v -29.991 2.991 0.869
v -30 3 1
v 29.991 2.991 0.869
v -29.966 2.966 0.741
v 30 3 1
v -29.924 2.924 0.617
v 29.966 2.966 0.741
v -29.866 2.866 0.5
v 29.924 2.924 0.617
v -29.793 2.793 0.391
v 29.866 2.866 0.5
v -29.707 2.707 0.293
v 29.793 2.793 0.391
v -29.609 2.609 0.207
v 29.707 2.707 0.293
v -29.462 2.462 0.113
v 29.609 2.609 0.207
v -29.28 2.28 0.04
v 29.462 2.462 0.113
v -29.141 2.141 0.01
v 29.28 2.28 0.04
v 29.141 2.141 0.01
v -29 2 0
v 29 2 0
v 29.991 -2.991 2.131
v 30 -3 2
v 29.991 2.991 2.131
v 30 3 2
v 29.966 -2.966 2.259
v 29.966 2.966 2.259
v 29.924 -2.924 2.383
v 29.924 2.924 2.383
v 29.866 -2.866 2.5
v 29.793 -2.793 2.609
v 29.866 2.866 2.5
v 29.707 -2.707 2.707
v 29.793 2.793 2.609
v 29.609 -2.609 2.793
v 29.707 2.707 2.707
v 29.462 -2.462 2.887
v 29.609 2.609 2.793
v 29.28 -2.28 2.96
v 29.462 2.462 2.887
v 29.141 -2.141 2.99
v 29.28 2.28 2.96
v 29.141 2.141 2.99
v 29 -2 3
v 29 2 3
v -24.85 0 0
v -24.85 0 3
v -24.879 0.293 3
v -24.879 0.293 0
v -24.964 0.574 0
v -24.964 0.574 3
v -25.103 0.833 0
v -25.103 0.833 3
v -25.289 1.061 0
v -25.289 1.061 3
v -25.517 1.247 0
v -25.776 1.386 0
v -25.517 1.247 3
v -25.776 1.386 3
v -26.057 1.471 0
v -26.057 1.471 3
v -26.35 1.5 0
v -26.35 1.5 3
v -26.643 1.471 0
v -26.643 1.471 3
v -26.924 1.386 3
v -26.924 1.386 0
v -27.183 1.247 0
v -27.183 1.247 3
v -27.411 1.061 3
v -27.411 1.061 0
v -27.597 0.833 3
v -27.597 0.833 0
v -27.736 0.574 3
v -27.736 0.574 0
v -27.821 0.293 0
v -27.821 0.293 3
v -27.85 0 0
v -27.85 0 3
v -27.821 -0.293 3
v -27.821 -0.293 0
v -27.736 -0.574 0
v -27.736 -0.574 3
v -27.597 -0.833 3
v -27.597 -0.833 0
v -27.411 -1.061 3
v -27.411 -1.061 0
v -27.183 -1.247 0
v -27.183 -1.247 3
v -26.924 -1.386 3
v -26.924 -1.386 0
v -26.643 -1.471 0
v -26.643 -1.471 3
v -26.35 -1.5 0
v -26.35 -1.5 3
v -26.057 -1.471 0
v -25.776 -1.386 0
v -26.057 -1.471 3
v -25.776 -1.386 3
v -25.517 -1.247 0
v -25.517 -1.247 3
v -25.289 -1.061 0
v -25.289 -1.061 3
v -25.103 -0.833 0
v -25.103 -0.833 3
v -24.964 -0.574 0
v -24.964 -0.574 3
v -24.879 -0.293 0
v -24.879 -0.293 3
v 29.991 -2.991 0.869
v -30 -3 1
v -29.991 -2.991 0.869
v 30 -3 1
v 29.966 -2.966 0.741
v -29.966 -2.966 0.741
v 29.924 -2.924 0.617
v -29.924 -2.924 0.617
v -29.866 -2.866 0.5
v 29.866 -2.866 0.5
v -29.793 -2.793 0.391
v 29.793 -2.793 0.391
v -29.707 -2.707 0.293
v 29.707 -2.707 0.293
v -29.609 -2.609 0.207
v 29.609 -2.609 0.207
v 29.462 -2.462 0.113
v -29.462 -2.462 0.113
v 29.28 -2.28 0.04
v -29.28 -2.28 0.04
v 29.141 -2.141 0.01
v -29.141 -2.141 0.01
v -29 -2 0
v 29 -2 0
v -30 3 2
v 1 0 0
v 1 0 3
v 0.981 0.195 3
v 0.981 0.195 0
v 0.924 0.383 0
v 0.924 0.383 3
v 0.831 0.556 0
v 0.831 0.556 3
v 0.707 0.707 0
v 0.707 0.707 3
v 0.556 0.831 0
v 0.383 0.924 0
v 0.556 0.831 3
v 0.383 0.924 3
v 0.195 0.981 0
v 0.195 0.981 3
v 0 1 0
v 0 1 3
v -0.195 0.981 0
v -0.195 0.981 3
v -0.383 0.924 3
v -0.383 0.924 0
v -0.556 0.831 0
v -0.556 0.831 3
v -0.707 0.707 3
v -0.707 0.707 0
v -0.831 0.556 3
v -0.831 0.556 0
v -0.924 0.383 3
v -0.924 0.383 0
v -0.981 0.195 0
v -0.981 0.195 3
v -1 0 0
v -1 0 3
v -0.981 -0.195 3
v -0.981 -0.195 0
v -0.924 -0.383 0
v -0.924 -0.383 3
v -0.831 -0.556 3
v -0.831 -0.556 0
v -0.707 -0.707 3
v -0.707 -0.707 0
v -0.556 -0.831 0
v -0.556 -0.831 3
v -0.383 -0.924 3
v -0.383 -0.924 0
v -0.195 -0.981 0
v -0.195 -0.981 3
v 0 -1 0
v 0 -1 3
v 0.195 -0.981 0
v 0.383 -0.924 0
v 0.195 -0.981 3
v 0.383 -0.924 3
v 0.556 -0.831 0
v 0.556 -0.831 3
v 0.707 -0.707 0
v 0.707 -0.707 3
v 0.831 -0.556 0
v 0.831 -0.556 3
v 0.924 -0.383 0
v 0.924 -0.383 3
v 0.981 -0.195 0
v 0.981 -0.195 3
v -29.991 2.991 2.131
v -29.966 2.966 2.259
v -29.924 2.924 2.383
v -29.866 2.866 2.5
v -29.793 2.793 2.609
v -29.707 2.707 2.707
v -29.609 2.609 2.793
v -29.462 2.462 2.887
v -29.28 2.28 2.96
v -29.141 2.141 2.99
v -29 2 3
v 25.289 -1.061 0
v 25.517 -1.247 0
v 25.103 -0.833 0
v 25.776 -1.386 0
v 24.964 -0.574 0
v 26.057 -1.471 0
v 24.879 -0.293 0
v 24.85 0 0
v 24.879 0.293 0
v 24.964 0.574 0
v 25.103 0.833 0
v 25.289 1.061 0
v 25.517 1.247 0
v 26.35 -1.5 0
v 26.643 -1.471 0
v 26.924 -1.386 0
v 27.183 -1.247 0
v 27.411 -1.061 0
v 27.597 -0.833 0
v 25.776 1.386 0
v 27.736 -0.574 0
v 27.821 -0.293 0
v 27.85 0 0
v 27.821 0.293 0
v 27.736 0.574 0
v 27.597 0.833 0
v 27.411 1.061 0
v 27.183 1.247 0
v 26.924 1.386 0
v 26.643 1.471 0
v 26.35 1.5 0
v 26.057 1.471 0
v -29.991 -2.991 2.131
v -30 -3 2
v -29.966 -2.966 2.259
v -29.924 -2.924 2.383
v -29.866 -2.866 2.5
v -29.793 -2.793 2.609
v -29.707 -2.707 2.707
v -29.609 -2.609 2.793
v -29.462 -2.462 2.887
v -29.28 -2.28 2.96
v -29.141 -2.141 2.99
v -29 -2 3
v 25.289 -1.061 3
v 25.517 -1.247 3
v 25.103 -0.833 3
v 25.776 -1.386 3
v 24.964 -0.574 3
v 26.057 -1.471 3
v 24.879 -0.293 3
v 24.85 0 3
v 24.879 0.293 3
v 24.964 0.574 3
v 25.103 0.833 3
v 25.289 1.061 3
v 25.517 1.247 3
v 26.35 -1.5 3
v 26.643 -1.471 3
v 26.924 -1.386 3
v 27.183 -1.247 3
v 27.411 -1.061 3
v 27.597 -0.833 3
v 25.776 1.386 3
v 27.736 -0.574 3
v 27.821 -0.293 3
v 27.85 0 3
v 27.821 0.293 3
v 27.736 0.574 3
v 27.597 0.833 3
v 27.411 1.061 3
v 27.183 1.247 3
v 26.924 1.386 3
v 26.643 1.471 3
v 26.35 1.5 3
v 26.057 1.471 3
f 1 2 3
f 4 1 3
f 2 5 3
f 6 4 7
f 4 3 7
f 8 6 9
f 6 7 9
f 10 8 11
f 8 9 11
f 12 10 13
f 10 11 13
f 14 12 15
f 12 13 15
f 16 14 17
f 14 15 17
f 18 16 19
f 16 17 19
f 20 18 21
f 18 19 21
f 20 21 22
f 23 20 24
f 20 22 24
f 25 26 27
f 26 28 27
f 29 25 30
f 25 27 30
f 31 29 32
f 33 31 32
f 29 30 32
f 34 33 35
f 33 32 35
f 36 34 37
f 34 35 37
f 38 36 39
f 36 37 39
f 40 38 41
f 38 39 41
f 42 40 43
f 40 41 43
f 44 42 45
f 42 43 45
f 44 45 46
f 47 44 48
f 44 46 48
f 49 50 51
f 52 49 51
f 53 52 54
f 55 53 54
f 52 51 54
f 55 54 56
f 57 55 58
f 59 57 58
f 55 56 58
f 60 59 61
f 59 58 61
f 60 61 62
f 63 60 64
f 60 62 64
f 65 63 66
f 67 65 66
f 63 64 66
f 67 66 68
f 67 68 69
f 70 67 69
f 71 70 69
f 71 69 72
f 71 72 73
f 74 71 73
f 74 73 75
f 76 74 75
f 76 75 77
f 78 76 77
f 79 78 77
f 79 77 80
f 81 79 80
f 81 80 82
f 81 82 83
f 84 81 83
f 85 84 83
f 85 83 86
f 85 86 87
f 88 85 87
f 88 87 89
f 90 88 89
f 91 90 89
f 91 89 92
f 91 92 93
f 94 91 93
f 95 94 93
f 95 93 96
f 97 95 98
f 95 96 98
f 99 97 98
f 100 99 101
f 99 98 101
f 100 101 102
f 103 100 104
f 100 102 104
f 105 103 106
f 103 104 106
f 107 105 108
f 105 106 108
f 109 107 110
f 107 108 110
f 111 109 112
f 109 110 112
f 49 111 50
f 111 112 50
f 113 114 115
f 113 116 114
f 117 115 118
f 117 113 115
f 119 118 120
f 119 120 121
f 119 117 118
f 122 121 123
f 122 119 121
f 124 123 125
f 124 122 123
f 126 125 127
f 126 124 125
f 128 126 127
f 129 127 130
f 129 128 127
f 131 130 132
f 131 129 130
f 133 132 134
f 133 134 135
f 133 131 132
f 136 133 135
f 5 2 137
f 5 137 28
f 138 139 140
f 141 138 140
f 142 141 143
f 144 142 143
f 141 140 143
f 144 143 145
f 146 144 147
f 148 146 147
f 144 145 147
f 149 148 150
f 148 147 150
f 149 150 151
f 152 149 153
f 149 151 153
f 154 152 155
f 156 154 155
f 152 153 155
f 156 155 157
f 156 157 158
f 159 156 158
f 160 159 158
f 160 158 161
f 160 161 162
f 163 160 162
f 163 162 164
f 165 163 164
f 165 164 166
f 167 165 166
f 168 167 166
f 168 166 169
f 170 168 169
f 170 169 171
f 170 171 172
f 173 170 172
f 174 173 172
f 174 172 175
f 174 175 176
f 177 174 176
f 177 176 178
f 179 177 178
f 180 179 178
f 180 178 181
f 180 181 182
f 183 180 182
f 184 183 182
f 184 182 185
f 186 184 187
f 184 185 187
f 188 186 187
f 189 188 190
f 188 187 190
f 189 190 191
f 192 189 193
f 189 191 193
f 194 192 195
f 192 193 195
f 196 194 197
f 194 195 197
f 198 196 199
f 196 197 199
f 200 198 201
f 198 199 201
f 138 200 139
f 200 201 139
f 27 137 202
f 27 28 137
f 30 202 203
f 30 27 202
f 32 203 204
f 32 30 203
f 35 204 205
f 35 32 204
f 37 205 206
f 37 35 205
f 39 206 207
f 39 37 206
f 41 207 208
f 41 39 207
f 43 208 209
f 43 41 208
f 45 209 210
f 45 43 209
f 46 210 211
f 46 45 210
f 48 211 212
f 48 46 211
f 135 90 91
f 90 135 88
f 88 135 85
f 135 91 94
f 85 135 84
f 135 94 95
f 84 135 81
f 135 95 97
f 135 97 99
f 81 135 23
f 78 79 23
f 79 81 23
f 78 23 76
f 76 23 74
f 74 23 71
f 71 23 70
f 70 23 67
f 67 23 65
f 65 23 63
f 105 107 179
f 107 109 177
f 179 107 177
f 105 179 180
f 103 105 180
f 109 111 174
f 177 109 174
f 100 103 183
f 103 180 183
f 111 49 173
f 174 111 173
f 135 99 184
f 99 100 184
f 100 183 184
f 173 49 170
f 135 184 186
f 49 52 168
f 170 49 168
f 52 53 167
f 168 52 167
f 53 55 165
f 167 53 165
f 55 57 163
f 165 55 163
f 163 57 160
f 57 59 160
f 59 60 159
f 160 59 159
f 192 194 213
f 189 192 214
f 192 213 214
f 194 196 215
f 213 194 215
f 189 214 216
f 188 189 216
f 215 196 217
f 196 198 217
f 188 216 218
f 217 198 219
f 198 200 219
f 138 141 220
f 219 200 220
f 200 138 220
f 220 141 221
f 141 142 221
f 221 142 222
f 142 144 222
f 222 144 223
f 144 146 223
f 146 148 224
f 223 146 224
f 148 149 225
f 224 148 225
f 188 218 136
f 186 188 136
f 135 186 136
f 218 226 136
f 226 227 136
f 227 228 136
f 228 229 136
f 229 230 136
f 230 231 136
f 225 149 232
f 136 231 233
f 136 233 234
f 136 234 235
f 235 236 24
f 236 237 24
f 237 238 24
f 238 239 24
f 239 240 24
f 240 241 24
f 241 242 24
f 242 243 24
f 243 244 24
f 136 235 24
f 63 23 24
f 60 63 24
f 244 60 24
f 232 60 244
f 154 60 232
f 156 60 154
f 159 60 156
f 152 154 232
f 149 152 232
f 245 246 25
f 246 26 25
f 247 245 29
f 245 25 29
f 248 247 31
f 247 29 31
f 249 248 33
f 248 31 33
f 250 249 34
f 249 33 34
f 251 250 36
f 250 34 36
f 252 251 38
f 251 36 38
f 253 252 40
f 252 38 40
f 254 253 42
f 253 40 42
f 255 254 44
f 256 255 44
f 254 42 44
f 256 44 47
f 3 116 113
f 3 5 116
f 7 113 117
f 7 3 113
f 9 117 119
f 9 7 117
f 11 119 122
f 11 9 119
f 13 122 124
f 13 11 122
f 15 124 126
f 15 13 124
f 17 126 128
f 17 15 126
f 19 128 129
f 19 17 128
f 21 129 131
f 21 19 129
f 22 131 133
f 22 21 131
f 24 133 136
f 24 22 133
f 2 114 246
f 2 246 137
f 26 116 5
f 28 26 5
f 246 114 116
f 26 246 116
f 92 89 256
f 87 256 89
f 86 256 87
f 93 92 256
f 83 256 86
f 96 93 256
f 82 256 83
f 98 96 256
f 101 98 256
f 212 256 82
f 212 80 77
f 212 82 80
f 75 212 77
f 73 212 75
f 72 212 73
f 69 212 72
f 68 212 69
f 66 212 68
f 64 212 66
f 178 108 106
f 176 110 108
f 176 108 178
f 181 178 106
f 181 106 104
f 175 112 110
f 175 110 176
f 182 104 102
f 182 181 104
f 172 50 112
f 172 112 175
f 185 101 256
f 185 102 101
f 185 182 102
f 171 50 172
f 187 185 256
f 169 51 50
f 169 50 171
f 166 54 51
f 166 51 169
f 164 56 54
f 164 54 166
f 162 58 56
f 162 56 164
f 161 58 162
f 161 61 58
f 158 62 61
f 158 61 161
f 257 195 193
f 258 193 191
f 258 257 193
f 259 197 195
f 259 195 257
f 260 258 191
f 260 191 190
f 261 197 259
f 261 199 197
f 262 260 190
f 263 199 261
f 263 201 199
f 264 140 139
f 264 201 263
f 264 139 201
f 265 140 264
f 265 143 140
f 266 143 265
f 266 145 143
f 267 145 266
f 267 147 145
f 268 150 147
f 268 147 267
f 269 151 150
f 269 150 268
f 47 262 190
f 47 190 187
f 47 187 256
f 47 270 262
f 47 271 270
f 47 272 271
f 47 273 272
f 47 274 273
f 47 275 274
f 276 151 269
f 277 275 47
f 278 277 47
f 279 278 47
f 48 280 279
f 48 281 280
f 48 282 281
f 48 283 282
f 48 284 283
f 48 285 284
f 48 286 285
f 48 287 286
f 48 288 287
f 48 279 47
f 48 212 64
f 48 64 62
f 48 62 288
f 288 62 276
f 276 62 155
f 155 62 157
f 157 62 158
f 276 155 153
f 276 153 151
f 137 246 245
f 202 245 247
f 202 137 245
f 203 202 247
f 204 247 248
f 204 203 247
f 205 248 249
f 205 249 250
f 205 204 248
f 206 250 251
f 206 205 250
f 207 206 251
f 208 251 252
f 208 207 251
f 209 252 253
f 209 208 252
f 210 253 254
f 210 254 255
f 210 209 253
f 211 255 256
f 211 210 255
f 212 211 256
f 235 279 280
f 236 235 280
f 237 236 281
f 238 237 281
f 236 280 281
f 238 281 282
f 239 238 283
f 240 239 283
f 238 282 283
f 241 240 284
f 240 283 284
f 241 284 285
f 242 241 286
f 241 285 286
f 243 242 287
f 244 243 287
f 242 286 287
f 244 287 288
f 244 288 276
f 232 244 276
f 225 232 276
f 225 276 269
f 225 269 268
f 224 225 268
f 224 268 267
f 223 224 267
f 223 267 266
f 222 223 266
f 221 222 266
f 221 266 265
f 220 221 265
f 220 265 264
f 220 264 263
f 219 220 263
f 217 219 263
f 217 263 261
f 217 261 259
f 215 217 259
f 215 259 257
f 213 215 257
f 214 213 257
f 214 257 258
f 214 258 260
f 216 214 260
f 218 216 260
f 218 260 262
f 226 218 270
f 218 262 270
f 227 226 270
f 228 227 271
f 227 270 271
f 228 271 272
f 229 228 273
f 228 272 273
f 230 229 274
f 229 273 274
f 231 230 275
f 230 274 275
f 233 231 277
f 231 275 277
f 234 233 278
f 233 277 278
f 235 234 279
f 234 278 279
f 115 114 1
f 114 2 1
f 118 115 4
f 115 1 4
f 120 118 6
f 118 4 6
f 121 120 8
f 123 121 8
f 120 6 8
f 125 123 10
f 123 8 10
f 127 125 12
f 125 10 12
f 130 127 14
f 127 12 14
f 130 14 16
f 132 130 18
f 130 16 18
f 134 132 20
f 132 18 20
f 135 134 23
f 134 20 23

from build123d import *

# Parameters (mm, degrees)
CROQUIS1_W              = 60
CROQUIS1_H              = 6
SALIENTE_EXTRUIR1_DEPTH = 3
REDONDEO1_R             = 1
CROQUIS2_R              = 1.5
CROQUIS2_R_2            = 1
CORTAR_EXTRUIR1_DEPTH   = 31.298514815


with BuildPart() as part:
    # Croquis1 → Saliente-Extruir1 (new body)
    with BuildSketch(Plane.XY):
        Rectangle(CROQUIS1_W, CROQUIS1_H)
    extrude(amount=SALIENTE_EXTRUIR1_DEPTH)

    # Redondeo1
    redondeo1_edges = [part.edges().sort_by_distance(p)[0] for p in [
        (30, 0, 3),
        (0, 3, 3),
        (-30, 0, 3),
        (0, 3, 0),
        (30, 0, 0),
        (0, -3, 0),
        (-30, 0, 0),
        (0, -3, 3),
    ]]
    fillet(redondeo1_edges, radius=REDONDEO1_R)

    # Croquis2 → Cortar-Extruir1 (cut, through all)
    with BuildSketch(Plane.XY.offset(3)):
        with Locations((-26.35, 0)):
            Circle(CROQUIS2_R)
        with Locations((26.35, 0)):
            Circle(CROQUIS2_R)
        Circle(CROQUIS2_R_2)
    extrude(amount=-CORTAR_EXTRUIR1_DEPTH, mode=Mode.SUBTRACT)


solid = part.part
